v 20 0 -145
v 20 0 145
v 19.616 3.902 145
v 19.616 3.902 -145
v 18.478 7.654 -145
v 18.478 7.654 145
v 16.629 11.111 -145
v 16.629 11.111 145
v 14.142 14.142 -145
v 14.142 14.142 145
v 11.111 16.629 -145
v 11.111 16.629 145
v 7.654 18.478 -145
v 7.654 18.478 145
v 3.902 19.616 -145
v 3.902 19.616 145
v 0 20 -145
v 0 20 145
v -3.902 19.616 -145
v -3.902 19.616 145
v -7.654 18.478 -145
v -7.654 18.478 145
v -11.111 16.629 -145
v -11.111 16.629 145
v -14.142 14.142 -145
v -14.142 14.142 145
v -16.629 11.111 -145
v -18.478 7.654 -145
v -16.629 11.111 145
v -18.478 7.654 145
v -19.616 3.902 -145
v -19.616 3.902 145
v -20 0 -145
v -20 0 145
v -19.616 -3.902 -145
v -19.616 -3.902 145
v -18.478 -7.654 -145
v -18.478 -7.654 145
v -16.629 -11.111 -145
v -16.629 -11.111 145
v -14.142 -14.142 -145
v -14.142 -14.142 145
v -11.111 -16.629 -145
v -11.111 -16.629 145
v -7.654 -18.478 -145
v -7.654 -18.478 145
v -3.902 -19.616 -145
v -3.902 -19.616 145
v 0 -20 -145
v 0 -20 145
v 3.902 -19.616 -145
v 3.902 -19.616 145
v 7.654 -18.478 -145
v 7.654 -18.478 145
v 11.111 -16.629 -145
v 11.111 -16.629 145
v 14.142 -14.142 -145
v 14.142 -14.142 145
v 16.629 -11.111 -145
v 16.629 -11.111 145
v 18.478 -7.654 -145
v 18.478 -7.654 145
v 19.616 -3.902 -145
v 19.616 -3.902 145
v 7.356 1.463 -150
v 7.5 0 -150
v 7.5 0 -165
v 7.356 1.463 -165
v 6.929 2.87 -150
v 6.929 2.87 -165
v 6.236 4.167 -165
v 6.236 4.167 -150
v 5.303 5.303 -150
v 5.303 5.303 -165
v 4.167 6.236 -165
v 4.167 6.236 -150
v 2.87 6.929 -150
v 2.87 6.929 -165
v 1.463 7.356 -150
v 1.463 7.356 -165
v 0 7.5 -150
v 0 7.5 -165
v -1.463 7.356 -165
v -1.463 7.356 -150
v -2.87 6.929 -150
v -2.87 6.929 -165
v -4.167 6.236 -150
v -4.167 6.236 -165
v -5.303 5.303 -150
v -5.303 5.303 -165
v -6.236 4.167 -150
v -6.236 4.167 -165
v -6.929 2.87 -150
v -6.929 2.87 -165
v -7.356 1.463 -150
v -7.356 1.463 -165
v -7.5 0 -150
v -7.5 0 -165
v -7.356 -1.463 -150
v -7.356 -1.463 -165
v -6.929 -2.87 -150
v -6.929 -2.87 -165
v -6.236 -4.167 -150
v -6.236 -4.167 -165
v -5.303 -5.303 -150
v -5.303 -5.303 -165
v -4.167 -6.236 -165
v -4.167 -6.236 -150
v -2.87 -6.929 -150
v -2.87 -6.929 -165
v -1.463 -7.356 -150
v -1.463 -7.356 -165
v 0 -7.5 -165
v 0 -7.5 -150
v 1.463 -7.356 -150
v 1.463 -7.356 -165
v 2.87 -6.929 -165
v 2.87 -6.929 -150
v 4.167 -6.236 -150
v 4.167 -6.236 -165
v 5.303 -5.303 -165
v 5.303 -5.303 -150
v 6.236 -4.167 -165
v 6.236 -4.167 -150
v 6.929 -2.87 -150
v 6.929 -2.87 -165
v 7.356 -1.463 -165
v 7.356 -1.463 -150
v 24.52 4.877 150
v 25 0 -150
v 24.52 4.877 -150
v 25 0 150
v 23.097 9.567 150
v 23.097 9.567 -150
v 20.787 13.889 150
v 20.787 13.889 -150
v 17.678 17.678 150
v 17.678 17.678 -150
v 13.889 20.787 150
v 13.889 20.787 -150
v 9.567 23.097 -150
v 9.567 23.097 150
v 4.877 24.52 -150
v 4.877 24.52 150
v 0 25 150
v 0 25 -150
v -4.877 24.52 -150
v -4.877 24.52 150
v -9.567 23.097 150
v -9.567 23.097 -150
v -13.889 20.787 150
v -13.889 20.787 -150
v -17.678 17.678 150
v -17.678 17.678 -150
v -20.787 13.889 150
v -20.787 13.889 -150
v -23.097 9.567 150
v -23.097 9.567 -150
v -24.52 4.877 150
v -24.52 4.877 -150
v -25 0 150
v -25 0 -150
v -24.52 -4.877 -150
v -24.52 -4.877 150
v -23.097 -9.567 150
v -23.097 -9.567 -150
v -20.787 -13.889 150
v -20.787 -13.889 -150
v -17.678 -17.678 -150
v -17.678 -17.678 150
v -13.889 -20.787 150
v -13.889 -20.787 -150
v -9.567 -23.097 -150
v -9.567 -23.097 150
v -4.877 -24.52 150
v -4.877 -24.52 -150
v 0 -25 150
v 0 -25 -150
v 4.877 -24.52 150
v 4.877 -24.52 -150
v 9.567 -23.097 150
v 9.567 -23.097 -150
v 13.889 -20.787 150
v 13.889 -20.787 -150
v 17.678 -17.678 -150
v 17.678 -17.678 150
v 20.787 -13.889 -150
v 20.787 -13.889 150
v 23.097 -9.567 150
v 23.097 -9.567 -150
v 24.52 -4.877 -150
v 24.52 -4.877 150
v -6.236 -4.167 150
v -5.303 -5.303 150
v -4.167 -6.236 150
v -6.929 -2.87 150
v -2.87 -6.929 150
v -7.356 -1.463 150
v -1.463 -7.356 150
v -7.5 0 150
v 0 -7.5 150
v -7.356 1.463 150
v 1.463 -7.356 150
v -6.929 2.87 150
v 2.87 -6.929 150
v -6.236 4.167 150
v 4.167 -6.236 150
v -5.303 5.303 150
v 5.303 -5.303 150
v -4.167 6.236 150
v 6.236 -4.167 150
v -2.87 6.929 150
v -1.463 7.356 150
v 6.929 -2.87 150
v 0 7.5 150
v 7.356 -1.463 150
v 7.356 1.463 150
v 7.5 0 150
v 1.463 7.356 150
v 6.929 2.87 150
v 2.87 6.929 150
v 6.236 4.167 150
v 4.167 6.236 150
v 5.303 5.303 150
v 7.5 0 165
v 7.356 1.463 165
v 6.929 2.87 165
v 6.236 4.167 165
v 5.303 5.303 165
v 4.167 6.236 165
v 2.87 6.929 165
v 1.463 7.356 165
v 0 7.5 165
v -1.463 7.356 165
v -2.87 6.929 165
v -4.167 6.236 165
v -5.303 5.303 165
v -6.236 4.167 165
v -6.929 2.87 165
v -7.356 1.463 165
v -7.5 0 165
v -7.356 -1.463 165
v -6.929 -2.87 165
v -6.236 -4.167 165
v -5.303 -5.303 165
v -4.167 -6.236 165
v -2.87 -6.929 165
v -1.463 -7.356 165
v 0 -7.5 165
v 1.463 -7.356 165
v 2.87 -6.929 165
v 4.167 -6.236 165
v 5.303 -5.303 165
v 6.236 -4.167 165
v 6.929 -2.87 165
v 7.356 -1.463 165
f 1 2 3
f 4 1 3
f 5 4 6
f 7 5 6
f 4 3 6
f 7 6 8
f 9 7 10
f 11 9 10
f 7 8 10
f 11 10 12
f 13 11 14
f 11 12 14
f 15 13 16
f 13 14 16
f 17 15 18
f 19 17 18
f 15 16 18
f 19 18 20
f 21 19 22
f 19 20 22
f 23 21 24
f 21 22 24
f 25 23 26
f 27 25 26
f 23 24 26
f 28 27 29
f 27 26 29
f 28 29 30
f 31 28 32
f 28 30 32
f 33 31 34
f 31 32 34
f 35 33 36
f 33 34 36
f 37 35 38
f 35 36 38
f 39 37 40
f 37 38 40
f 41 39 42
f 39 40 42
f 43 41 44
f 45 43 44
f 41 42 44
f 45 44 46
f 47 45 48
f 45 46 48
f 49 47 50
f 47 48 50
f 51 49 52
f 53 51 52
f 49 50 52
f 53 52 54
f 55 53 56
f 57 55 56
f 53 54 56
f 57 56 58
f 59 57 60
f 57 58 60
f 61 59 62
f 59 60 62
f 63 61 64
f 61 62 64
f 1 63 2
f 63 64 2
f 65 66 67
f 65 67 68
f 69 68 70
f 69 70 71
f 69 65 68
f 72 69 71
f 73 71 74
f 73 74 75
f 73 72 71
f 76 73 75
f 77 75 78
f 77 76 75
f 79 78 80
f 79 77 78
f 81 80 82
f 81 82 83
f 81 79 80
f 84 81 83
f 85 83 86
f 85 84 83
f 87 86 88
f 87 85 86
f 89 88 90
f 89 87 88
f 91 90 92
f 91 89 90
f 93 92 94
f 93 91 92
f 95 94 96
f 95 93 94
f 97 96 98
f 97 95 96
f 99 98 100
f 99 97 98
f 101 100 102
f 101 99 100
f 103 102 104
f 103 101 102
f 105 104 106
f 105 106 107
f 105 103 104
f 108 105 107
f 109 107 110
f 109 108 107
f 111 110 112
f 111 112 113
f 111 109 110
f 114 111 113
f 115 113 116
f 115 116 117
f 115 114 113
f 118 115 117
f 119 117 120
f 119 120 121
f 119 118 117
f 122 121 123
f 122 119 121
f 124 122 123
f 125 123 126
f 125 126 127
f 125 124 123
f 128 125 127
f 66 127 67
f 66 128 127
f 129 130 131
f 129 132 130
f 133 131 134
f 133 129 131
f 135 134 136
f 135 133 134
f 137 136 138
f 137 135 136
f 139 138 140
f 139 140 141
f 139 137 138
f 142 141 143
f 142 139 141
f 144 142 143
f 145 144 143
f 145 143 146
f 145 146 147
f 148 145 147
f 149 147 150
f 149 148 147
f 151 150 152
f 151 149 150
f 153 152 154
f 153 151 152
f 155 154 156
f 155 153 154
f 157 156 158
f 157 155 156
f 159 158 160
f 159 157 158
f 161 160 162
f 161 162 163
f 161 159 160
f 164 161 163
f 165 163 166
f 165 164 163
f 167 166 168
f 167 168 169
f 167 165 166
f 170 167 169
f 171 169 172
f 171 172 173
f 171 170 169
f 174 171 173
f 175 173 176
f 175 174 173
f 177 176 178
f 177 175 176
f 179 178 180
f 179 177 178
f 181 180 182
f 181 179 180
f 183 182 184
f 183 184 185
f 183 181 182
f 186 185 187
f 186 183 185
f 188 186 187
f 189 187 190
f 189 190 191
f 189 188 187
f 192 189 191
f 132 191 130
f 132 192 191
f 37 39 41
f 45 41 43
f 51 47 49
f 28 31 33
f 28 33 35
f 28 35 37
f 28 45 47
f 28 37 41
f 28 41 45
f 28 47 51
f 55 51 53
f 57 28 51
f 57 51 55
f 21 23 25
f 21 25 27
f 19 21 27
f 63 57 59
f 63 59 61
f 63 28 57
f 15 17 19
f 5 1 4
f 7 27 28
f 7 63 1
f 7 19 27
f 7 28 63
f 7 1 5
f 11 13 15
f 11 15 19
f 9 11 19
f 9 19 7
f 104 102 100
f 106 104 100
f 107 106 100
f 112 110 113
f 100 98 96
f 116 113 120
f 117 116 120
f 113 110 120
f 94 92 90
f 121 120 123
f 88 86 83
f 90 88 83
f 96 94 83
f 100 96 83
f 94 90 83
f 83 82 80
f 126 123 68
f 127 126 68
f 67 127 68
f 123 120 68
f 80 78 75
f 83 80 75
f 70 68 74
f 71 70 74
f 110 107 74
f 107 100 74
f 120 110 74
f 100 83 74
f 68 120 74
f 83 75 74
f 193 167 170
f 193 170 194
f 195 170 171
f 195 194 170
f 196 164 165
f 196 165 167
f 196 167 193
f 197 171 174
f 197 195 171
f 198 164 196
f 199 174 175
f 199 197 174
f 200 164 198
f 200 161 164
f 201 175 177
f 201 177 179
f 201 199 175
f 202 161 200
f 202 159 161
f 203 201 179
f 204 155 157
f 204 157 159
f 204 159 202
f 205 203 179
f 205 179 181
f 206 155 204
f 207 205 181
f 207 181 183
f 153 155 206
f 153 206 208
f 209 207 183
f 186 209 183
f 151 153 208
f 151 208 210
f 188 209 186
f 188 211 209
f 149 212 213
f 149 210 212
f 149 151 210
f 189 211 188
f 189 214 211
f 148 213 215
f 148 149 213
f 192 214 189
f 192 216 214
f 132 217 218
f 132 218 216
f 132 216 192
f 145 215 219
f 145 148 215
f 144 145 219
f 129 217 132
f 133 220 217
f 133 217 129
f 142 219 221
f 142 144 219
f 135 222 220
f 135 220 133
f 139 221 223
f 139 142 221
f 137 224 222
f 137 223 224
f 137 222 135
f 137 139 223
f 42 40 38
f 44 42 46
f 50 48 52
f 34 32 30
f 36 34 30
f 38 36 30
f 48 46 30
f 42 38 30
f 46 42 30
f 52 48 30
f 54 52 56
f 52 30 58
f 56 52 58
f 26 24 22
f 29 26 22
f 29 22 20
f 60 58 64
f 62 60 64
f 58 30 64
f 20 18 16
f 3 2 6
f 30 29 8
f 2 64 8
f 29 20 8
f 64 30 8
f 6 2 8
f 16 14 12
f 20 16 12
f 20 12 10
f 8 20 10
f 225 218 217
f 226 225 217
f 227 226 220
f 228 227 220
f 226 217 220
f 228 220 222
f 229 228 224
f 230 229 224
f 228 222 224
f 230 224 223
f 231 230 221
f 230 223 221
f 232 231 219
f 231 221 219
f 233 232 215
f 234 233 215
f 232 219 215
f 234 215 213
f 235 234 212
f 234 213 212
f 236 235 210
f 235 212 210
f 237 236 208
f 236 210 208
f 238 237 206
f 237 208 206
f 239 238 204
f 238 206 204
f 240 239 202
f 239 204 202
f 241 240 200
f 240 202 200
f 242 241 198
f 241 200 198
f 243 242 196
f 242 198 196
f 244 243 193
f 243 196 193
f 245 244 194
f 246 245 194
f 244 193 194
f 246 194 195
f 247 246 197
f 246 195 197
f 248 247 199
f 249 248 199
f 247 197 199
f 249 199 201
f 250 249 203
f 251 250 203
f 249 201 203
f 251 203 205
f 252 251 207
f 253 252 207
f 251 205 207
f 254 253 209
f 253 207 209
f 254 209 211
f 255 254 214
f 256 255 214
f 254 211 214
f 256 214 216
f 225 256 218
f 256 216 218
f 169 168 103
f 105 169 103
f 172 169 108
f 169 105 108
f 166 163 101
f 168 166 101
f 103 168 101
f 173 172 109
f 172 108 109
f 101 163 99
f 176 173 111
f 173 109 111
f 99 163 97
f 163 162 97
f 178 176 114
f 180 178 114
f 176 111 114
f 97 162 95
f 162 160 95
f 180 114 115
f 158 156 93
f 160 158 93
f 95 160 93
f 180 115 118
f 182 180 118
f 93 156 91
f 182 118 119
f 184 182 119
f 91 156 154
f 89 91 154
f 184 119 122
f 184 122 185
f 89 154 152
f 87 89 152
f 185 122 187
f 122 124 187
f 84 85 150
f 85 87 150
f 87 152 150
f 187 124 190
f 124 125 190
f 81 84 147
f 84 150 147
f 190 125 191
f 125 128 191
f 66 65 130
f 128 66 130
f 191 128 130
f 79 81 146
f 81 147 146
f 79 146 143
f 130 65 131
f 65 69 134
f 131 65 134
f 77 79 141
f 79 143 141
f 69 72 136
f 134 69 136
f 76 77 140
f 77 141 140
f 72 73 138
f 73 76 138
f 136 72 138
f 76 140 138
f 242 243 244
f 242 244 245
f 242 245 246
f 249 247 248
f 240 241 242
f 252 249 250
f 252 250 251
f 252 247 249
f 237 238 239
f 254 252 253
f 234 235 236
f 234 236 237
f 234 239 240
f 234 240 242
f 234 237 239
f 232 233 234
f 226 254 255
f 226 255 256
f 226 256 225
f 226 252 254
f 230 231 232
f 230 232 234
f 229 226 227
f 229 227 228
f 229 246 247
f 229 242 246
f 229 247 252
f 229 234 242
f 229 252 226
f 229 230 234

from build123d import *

# Parameters (mm, degrees)
SKETCH1_R           = 25
BOSS_EXTRUDE1_DEPTH = 150
SHELL1_T            = 5
SKETCH2_R           = 7.5
BOSS_EXTRUDE2_DEPTH = 15


with BuildPart() as part:
    # Sketch1 → Boss-Extrude1 (new, symmetric)
    with BuildSketch(Plane.XY):
        Circle(SKETCH1_R)
    extrude(amount=BOSS_EXTRUDE1_DEPTH, both=True)

    # Shell1 (no face opened: a closed hollow body)
    add(offset(amount=-SHELL1_T, mode=Mode.PRIVATE), mode=Mode.SUBTRACT)

    # Sketch2 → Boss-Extrude2 (add)
    with BuildSketch(Plane.XY.offset(150)):
        Circle(SKETCH2_R)
    boss_extrude2 = extrude(amount=BOSS_EXTRUDE2_DEPTH)

    # Mirror1: Boss-Extrude2 across plane
    add(boss_extrude2.mirror(Plane.XY))


solid = part.part
